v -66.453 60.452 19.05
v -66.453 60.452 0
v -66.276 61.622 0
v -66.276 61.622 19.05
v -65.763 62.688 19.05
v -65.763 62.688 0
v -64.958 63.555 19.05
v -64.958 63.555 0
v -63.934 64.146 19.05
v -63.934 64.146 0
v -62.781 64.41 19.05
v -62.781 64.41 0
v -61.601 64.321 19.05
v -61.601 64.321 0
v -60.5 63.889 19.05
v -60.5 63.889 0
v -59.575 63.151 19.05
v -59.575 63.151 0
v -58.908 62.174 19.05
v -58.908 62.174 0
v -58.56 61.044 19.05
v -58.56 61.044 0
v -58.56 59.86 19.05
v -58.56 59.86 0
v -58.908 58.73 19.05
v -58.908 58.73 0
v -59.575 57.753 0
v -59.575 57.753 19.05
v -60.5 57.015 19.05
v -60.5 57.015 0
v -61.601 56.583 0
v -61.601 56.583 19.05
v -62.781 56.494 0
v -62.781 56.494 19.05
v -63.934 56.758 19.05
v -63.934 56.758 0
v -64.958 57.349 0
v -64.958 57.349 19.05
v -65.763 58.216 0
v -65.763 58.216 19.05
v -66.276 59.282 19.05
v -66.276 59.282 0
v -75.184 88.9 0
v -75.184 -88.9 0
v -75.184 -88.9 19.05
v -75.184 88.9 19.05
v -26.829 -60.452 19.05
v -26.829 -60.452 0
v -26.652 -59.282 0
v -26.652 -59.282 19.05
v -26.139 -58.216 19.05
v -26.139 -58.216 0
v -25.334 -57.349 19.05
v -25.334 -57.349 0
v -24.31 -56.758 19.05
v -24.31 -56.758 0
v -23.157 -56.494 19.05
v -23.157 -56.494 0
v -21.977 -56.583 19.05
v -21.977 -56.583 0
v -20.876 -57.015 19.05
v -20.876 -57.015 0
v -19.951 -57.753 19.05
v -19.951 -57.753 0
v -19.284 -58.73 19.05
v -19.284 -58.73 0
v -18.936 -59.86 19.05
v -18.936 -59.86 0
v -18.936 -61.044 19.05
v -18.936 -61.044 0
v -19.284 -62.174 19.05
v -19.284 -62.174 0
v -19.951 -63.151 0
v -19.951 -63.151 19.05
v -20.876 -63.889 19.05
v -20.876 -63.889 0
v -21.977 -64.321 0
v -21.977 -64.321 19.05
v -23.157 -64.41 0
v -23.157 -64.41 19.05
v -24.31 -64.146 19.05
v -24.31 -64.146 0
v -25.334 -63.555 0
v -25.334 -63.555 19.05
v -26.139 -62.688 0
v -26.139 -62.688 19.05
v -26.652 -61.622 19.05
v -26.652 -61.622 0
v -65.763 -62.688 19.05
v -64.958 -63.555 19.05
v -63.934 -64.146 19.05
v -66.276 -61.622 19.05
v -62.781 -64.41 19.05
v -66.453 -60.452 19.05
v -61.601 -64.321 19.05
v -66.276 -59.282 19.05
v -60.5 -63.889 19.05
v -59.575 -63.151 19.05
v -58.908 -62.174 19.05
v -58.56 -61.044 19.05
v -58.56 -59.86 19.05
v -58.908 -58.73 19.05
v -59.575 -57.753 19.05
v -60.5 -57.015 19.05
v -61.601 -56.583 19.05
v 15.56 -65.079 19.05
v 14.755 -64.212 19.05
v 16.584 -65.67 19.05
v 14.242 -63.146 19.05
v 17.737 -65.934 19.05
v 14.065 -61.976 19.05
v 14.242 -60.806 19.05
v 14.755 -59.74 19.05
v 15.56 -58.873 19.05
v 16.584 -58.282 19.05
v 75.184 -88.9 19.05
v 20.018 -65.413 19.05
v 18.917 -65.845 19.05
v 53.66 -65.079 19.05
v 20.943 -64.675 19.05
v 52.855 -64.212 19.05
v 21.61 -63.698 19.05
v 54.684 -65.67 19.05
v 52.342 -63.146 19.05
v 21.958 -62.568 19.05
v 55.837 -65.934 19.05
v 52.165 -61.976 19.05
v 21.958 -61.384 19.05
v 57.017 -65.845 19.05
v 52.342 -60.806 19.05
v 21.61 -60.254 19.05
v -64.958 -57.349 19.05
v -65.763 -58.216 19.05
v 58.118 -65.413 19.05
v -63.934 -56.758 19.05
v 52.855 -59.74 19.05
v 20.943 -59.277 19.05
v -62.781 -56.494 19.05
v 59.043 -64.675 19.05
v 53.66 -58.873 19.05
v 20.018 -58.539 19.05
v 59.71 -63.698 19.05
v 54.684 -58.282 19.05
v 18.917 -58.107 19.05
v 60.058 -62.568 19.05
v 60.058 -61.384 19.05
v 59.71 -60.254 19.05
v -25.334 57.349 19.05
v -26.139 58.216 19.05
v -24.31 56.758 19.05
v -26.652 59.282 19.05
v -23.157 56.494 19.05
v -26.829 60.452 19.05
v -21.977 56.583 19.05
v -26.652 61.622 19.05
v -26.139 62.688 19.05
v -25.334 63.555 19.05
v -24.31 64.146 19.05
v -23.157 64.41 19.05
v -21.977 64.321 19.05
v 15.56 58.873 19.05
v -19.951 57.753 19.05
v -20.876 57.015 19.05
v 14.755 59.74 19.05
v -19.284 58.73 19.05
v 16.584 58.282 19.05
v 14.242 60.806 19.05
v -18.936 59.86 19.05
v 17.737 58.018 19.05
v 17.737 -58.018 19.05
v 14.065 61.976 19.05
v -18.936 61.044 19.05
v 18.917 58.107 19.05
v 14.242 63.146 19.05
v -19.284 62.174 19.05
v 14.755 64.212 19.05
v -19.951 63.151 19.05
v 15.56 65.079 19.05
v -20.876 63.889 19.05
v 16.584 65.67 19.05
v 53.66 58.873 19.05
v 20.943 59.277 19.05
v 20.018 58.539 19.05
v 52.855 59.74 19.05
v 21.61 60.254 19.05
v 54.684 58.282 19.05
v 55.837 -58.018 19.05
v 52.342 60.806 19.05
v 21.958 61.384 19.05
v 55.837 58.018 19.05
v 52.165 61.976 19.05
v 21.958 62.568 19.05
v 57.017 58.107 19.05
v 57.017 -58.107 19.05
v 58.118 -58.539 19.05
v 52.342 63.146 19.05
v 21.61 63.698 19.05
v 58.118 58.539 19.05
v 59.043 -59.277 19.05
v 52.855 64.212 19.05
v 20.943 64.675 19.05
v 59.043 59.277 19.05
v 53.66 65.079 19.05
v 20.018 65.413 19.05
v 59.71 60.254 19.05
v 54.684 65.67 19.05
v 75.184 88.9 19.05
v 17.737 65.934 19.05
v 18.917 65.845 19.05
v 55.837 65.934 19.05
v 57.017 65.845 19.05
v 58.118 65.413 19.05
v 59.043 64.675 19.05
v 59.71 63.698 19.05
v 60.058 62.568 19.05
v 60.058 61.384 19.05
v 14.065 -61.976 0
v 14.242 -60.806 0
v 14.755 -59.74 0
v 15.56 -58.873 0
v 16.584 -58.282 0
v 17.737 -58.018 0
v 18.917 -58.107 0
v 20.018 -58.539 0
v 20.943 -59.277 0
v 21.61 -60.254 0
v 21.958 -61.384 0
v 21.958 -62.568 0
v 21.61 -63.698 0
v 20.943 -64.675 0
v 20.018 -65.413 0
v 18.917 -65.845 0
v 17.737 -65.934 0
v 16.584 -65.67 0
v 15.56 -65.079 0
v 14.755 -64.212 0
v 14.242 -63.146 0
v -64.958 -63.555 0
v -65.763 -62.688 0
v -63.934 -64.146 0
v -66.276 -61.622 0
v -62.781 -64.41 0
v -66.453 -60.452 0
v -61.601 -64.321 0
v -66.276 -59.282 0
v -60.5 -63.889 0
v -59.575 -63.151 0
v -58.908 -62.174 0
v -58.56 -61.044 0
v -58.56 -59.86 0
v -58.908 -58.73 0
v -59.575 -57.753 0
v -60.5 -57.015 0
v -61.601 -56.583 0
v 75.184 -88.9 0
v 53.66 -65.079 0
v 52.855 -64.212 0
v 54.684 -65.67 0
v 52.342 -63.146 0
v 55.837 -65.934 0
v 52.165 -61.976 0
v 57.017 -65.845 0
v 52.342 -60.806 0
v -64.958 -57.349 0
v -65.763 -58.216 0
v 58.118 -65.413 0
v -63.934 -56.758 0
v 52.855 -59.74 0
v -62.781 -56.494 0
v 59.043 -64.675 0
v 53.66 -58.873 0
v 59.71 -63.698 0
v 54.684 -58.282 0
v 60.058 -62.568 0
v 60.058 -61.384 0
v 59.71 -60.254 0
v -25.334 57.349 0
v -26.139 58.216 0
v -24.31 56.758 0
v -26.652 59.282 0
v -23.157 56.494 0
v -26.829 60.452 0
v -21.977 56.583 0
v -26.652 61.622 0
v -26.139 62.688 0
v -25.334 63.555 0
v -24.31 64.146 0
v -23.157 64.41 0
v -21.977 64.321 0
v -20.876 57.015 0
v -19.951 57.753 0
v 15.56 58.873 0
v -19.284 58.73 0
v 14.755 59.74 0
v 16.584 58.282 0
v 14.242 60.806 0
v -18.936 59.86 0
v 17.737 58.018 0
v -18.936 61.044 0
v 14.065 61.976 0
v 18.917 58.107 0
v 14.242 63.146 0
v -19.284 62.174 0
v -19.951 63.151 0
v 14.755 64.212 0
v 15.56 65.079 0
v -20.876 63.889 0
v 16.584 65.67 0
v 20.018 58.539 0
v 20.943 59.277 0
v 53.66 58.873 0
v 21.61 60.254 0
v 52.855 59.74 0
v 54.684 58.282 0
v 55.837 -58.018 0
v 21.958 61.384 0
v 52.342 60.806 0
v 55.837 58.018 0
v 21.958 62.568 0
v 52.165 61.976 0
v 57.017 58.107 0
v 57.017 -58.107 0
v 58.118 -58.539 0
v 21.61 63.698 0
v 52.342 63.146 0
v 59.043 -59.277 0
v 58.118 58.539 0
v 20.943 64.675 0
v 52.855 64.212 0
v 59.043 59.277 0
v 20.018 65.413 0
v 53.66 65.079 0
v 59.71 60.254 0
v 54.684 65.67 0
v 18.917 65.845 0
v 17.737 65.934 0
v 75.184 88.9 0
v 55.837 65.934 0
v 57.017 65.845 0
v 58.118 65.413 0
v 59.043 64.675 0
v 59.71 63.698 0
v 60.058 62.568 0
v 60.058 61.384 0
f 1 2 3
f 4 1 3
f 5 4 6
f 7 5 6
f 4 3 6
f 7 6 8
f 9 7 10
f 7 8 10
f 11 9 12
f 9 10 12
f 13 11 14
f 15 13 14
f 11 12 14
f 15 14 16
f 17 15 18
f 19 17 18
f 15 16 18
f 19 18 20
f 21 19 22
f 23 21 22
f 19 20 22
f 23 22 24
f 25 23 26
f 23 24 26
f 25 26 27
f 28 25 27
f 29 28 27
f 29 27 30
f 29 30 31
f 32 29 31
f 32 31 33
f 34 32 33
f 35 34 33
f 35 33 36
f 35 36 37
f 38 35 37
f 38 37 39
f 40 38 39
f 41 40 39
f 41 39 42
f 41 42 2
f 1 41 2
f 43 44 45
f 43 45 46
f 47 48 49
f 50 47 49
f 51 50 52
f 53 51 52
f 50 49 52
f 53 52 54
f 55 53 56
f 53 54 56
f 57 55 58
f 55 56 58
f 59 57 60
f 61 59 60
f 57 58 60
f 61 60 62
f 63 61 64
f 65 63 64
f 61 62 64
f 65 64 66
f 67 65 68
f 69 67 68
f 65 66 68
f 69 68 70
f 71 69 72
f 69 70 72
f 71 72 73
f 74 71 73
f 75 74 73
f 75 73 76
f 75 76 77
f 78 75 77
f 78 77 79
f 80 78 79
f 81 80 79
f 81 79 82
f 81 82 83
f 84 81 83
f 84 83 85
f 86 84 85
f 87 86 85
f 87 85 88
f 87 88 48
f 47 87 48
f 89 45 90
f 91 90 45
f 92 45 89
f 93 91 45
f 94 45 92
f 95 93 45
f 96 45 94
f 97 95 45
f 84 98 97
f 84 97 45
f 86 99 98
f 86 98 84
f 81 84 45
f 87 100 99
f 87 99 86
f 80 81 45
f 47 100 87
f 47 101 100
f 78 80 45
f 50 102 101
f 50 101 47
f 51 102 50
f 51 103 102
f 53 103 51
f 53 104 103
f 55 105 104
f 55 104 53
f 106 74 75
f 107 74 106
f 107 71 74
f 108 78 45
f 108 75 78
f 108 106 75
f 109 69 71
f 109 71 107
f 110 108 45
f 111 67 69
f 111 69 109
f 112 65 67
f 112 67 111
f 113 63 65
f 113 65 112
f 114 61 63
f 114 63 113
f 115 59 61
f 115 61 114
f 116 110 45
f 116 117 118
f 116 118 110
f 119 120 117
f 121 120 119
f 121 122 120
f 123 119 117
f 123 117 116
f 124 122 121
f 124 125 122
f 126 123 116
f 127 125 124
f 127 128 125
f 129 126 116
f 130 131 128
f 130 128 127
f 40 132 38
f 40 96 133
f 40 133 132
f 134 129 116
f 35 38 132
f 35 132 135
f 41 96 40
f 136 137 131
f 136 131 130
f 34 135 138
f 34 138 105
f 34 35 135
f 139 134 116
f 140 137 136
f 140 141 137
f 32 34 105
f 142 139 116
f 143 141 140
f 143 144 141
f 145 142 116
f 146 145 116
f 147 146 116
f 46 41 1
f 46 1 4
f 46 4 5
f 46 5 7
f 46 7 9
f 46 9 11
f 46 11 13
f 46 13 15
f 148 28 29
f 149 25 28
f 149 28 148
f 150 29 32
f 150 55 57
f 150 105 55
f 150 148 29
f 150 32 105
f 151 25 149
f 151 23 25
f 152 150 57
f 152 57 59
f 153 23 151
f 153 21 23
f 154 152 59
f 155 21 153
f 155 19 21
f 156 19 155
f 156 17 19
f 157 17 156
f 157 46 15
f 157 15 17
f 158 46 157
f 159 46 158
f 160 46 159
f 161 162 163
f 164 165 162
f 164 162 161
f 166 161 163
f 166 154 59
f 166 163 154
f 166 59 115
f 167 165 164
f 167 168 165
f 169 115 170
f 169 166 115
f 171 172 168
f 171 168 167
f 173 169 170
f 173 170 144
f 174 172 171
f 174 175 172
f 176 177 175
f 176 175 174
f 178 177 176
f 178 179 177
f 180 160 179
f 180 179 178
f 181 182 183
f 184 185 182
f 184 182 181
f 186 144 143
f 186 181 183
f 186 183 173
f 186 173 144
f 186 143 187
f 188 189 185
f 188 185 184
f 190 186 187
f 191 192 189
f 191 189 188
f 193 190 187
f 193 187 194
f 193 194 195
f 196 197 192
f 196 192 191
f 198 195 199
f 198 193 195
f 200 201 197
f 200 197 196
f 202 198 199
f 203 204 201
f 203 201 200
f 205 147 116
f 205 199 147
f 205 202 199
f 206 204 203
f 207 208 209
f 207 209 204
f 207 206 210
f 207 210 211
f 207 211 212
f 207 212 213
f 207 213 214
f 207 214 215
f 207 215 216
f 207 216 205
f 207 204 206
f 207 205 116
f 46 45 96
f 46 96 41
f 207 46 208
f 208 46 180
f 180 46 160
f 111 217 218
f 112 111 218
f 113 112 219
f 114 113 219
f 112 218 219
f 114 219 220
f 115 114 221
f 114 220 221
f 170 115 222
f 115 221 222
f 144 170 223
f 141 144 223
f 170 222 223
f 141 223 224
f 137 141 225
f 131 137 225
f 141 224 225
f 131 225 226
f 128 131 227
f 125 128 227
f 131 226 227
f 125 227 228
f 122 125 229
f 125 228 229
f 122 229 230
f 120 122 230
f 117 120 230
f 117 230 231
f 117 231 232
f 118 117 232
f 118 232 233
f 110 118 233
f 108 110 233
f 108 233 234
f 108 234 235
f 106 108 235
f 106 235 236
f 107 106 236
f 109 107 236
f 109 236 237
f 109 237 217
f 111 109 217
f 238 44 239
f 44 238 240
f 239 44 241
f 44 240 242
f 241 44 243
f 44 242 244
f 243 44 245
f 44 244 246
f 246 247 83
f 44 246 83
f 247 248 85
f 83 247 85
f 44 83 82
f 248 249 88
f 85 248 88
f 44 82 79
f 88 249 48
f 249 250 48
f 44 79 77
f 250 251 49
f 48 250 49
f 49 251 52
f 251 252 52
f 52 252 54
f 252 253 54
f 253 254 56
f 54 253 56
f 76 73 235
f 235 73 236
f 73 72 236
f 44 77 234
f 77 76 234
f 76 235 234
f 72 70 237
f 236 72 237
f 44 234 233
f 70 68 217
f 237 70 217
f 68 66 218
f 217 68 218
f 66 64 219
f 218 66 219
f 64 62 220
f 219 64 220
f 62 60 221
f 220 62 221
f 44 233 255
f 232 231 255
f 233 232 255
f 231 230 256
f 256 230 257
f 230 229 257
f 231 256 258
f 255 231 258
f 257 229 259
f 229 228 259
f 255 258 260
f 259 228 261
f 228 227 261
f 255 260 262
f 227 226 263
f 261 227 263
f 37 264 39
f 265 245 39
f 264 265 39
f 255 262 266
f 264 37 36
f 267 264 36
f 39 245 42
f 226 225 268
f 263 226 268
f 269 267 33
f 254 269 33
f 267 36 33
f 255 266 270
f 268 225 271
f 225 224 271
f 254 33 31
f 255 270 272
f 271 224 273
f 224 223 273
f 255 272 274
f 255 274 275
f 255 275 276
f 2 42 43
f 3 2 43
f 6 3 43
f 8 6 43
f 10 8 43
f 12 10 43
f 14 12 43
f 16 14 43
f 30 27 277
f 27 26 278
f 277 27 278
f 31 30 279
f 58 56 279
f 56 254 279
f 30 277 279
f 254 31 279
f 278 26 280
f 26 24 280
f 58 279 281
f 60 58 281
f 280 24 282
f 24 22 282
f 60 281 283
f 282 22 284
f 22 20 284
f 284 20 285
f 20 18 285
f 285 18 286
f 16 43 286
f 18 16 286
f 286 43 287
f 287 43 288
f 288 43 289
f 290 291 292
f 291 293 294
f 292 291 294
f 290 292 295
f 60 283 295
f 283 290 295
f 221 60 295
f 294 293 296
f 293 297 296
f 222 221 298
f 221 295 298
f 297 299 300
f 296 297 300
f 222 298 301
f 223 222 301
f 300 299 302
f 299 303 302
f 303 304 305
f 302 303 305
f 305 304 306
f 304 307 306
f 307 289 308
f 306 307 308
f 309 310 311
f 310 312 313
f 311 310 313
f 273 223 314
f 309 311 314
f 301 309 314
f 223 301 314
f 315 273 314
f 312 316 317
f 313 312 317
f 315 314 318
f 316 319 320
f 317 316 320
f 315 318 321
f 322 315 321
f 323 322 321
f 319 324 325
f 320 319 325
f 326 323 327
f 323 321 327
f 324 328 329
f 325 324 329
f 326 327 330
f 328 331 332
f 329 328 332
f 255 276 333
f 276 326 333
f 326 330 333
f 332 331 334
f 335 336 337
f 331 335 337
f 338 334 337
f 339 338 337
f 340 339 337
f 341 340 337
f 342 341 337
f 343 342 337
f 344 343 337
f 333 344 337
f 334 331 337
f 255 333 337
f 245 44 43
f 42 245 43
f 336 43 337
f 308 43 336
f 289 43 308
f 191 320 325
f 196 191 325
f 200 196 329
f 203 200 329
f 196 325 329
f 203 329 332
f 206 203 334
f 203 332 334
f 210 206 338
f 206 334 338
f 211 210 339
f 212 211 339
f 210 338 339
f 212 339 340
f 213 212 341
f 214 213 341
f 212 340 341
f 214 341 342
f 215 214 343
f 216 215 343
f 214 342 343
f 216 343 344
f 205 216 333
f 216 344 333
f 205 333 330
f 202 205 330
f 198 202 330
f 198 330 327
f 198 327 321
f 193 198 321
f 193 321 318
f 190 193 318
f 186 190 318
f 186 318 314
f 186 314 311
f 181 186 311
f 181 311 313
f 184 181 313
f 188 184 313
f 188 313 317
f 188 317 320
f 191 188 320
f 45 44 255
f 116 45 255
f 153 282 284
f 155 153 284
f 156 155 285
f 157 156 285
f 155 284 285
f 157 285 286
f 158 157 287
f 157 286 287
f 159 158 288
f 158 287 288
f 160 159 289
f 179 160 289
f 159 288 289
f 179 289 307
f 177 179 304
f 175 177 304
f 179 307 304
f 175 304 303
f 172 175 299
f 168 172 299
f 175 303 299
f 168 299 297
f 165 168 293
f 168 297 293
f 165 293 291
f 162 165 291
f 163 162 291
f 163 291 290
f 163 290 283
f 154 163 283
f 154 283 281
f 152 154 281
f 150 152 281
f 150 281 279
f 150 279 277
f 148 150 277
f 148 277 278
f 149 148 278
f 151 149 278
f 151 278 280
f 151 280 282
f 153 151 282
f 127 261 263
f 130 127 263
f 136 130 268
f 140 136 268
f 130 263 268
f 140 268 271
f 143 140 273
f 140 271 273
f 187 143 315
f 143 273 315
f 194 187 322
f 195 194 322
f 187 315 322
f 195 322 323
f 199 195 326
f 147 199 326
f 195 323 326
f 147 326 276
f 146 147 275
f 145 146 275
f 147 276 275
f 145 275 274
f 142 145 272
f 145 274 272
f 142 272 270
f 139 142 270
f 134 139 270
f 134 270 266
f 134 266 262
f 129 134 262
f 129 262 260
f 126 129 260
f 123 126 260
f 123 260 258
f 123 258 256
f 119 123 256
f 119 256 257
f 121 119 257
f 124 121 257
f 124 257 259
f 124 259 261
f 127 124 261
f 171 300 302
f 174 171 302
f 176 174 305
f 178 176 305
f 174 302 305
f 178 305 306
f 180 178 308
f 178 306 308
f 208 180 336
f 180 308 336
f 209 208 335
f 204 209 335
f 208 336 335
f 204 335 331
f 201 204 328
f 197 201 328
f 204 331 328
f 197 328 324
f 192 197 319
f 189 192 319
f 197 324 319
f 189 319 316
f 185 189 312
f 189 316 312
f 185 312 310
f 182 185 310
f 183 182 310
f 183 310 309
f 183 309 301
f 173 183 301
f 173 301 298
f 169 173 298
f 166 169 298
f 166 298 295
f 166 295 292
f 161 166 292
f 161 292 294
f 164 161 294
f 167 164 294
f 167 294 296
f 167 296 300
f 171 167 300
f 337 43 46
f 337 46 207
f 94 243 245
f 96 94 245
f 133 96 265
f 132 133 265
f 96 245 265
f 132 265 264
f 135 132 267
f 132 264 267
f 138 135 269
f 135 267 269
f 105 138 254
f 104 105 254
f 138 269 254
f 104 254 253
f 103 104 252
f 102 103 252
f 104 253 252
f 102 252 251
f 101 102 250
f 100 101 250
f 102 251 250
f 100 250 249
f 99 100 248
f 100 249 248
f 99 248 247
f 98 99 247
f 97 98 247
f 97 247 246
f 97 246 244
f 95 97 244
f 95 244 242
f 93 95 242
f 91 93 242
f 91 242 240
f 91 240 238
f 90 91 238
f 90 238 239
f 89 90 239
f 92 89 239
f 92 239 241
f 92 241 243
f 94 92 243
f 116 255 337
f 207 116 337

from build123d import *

# Parameters (mm, degrees)
F0_W     = 150.368
F0_H     = 177.8
F1_DEPTH = 19.05
F3_D     = 7.9375


with BuildPart() as f1:
    # F0 (on Top) → F1 (new body)
    with BuildSketch(Plane.XY):
        Rectangle(F0_W, F0_H)
    extrude(amount=F1_DEPTH)

    # F3 (through all)
    with Locations(Plane.XY.offset(19.05)):
        with Locations((18.034, 61.976), (56.134, 61.976), (18.034, -61.976), (56.134, -61.976), (-62.484, 60.452), (-22.86, 60.452), (-62.484, -60.452), (-22.86, -60.452)):
            Hole(F3_D / 2)


solid = f1.part
